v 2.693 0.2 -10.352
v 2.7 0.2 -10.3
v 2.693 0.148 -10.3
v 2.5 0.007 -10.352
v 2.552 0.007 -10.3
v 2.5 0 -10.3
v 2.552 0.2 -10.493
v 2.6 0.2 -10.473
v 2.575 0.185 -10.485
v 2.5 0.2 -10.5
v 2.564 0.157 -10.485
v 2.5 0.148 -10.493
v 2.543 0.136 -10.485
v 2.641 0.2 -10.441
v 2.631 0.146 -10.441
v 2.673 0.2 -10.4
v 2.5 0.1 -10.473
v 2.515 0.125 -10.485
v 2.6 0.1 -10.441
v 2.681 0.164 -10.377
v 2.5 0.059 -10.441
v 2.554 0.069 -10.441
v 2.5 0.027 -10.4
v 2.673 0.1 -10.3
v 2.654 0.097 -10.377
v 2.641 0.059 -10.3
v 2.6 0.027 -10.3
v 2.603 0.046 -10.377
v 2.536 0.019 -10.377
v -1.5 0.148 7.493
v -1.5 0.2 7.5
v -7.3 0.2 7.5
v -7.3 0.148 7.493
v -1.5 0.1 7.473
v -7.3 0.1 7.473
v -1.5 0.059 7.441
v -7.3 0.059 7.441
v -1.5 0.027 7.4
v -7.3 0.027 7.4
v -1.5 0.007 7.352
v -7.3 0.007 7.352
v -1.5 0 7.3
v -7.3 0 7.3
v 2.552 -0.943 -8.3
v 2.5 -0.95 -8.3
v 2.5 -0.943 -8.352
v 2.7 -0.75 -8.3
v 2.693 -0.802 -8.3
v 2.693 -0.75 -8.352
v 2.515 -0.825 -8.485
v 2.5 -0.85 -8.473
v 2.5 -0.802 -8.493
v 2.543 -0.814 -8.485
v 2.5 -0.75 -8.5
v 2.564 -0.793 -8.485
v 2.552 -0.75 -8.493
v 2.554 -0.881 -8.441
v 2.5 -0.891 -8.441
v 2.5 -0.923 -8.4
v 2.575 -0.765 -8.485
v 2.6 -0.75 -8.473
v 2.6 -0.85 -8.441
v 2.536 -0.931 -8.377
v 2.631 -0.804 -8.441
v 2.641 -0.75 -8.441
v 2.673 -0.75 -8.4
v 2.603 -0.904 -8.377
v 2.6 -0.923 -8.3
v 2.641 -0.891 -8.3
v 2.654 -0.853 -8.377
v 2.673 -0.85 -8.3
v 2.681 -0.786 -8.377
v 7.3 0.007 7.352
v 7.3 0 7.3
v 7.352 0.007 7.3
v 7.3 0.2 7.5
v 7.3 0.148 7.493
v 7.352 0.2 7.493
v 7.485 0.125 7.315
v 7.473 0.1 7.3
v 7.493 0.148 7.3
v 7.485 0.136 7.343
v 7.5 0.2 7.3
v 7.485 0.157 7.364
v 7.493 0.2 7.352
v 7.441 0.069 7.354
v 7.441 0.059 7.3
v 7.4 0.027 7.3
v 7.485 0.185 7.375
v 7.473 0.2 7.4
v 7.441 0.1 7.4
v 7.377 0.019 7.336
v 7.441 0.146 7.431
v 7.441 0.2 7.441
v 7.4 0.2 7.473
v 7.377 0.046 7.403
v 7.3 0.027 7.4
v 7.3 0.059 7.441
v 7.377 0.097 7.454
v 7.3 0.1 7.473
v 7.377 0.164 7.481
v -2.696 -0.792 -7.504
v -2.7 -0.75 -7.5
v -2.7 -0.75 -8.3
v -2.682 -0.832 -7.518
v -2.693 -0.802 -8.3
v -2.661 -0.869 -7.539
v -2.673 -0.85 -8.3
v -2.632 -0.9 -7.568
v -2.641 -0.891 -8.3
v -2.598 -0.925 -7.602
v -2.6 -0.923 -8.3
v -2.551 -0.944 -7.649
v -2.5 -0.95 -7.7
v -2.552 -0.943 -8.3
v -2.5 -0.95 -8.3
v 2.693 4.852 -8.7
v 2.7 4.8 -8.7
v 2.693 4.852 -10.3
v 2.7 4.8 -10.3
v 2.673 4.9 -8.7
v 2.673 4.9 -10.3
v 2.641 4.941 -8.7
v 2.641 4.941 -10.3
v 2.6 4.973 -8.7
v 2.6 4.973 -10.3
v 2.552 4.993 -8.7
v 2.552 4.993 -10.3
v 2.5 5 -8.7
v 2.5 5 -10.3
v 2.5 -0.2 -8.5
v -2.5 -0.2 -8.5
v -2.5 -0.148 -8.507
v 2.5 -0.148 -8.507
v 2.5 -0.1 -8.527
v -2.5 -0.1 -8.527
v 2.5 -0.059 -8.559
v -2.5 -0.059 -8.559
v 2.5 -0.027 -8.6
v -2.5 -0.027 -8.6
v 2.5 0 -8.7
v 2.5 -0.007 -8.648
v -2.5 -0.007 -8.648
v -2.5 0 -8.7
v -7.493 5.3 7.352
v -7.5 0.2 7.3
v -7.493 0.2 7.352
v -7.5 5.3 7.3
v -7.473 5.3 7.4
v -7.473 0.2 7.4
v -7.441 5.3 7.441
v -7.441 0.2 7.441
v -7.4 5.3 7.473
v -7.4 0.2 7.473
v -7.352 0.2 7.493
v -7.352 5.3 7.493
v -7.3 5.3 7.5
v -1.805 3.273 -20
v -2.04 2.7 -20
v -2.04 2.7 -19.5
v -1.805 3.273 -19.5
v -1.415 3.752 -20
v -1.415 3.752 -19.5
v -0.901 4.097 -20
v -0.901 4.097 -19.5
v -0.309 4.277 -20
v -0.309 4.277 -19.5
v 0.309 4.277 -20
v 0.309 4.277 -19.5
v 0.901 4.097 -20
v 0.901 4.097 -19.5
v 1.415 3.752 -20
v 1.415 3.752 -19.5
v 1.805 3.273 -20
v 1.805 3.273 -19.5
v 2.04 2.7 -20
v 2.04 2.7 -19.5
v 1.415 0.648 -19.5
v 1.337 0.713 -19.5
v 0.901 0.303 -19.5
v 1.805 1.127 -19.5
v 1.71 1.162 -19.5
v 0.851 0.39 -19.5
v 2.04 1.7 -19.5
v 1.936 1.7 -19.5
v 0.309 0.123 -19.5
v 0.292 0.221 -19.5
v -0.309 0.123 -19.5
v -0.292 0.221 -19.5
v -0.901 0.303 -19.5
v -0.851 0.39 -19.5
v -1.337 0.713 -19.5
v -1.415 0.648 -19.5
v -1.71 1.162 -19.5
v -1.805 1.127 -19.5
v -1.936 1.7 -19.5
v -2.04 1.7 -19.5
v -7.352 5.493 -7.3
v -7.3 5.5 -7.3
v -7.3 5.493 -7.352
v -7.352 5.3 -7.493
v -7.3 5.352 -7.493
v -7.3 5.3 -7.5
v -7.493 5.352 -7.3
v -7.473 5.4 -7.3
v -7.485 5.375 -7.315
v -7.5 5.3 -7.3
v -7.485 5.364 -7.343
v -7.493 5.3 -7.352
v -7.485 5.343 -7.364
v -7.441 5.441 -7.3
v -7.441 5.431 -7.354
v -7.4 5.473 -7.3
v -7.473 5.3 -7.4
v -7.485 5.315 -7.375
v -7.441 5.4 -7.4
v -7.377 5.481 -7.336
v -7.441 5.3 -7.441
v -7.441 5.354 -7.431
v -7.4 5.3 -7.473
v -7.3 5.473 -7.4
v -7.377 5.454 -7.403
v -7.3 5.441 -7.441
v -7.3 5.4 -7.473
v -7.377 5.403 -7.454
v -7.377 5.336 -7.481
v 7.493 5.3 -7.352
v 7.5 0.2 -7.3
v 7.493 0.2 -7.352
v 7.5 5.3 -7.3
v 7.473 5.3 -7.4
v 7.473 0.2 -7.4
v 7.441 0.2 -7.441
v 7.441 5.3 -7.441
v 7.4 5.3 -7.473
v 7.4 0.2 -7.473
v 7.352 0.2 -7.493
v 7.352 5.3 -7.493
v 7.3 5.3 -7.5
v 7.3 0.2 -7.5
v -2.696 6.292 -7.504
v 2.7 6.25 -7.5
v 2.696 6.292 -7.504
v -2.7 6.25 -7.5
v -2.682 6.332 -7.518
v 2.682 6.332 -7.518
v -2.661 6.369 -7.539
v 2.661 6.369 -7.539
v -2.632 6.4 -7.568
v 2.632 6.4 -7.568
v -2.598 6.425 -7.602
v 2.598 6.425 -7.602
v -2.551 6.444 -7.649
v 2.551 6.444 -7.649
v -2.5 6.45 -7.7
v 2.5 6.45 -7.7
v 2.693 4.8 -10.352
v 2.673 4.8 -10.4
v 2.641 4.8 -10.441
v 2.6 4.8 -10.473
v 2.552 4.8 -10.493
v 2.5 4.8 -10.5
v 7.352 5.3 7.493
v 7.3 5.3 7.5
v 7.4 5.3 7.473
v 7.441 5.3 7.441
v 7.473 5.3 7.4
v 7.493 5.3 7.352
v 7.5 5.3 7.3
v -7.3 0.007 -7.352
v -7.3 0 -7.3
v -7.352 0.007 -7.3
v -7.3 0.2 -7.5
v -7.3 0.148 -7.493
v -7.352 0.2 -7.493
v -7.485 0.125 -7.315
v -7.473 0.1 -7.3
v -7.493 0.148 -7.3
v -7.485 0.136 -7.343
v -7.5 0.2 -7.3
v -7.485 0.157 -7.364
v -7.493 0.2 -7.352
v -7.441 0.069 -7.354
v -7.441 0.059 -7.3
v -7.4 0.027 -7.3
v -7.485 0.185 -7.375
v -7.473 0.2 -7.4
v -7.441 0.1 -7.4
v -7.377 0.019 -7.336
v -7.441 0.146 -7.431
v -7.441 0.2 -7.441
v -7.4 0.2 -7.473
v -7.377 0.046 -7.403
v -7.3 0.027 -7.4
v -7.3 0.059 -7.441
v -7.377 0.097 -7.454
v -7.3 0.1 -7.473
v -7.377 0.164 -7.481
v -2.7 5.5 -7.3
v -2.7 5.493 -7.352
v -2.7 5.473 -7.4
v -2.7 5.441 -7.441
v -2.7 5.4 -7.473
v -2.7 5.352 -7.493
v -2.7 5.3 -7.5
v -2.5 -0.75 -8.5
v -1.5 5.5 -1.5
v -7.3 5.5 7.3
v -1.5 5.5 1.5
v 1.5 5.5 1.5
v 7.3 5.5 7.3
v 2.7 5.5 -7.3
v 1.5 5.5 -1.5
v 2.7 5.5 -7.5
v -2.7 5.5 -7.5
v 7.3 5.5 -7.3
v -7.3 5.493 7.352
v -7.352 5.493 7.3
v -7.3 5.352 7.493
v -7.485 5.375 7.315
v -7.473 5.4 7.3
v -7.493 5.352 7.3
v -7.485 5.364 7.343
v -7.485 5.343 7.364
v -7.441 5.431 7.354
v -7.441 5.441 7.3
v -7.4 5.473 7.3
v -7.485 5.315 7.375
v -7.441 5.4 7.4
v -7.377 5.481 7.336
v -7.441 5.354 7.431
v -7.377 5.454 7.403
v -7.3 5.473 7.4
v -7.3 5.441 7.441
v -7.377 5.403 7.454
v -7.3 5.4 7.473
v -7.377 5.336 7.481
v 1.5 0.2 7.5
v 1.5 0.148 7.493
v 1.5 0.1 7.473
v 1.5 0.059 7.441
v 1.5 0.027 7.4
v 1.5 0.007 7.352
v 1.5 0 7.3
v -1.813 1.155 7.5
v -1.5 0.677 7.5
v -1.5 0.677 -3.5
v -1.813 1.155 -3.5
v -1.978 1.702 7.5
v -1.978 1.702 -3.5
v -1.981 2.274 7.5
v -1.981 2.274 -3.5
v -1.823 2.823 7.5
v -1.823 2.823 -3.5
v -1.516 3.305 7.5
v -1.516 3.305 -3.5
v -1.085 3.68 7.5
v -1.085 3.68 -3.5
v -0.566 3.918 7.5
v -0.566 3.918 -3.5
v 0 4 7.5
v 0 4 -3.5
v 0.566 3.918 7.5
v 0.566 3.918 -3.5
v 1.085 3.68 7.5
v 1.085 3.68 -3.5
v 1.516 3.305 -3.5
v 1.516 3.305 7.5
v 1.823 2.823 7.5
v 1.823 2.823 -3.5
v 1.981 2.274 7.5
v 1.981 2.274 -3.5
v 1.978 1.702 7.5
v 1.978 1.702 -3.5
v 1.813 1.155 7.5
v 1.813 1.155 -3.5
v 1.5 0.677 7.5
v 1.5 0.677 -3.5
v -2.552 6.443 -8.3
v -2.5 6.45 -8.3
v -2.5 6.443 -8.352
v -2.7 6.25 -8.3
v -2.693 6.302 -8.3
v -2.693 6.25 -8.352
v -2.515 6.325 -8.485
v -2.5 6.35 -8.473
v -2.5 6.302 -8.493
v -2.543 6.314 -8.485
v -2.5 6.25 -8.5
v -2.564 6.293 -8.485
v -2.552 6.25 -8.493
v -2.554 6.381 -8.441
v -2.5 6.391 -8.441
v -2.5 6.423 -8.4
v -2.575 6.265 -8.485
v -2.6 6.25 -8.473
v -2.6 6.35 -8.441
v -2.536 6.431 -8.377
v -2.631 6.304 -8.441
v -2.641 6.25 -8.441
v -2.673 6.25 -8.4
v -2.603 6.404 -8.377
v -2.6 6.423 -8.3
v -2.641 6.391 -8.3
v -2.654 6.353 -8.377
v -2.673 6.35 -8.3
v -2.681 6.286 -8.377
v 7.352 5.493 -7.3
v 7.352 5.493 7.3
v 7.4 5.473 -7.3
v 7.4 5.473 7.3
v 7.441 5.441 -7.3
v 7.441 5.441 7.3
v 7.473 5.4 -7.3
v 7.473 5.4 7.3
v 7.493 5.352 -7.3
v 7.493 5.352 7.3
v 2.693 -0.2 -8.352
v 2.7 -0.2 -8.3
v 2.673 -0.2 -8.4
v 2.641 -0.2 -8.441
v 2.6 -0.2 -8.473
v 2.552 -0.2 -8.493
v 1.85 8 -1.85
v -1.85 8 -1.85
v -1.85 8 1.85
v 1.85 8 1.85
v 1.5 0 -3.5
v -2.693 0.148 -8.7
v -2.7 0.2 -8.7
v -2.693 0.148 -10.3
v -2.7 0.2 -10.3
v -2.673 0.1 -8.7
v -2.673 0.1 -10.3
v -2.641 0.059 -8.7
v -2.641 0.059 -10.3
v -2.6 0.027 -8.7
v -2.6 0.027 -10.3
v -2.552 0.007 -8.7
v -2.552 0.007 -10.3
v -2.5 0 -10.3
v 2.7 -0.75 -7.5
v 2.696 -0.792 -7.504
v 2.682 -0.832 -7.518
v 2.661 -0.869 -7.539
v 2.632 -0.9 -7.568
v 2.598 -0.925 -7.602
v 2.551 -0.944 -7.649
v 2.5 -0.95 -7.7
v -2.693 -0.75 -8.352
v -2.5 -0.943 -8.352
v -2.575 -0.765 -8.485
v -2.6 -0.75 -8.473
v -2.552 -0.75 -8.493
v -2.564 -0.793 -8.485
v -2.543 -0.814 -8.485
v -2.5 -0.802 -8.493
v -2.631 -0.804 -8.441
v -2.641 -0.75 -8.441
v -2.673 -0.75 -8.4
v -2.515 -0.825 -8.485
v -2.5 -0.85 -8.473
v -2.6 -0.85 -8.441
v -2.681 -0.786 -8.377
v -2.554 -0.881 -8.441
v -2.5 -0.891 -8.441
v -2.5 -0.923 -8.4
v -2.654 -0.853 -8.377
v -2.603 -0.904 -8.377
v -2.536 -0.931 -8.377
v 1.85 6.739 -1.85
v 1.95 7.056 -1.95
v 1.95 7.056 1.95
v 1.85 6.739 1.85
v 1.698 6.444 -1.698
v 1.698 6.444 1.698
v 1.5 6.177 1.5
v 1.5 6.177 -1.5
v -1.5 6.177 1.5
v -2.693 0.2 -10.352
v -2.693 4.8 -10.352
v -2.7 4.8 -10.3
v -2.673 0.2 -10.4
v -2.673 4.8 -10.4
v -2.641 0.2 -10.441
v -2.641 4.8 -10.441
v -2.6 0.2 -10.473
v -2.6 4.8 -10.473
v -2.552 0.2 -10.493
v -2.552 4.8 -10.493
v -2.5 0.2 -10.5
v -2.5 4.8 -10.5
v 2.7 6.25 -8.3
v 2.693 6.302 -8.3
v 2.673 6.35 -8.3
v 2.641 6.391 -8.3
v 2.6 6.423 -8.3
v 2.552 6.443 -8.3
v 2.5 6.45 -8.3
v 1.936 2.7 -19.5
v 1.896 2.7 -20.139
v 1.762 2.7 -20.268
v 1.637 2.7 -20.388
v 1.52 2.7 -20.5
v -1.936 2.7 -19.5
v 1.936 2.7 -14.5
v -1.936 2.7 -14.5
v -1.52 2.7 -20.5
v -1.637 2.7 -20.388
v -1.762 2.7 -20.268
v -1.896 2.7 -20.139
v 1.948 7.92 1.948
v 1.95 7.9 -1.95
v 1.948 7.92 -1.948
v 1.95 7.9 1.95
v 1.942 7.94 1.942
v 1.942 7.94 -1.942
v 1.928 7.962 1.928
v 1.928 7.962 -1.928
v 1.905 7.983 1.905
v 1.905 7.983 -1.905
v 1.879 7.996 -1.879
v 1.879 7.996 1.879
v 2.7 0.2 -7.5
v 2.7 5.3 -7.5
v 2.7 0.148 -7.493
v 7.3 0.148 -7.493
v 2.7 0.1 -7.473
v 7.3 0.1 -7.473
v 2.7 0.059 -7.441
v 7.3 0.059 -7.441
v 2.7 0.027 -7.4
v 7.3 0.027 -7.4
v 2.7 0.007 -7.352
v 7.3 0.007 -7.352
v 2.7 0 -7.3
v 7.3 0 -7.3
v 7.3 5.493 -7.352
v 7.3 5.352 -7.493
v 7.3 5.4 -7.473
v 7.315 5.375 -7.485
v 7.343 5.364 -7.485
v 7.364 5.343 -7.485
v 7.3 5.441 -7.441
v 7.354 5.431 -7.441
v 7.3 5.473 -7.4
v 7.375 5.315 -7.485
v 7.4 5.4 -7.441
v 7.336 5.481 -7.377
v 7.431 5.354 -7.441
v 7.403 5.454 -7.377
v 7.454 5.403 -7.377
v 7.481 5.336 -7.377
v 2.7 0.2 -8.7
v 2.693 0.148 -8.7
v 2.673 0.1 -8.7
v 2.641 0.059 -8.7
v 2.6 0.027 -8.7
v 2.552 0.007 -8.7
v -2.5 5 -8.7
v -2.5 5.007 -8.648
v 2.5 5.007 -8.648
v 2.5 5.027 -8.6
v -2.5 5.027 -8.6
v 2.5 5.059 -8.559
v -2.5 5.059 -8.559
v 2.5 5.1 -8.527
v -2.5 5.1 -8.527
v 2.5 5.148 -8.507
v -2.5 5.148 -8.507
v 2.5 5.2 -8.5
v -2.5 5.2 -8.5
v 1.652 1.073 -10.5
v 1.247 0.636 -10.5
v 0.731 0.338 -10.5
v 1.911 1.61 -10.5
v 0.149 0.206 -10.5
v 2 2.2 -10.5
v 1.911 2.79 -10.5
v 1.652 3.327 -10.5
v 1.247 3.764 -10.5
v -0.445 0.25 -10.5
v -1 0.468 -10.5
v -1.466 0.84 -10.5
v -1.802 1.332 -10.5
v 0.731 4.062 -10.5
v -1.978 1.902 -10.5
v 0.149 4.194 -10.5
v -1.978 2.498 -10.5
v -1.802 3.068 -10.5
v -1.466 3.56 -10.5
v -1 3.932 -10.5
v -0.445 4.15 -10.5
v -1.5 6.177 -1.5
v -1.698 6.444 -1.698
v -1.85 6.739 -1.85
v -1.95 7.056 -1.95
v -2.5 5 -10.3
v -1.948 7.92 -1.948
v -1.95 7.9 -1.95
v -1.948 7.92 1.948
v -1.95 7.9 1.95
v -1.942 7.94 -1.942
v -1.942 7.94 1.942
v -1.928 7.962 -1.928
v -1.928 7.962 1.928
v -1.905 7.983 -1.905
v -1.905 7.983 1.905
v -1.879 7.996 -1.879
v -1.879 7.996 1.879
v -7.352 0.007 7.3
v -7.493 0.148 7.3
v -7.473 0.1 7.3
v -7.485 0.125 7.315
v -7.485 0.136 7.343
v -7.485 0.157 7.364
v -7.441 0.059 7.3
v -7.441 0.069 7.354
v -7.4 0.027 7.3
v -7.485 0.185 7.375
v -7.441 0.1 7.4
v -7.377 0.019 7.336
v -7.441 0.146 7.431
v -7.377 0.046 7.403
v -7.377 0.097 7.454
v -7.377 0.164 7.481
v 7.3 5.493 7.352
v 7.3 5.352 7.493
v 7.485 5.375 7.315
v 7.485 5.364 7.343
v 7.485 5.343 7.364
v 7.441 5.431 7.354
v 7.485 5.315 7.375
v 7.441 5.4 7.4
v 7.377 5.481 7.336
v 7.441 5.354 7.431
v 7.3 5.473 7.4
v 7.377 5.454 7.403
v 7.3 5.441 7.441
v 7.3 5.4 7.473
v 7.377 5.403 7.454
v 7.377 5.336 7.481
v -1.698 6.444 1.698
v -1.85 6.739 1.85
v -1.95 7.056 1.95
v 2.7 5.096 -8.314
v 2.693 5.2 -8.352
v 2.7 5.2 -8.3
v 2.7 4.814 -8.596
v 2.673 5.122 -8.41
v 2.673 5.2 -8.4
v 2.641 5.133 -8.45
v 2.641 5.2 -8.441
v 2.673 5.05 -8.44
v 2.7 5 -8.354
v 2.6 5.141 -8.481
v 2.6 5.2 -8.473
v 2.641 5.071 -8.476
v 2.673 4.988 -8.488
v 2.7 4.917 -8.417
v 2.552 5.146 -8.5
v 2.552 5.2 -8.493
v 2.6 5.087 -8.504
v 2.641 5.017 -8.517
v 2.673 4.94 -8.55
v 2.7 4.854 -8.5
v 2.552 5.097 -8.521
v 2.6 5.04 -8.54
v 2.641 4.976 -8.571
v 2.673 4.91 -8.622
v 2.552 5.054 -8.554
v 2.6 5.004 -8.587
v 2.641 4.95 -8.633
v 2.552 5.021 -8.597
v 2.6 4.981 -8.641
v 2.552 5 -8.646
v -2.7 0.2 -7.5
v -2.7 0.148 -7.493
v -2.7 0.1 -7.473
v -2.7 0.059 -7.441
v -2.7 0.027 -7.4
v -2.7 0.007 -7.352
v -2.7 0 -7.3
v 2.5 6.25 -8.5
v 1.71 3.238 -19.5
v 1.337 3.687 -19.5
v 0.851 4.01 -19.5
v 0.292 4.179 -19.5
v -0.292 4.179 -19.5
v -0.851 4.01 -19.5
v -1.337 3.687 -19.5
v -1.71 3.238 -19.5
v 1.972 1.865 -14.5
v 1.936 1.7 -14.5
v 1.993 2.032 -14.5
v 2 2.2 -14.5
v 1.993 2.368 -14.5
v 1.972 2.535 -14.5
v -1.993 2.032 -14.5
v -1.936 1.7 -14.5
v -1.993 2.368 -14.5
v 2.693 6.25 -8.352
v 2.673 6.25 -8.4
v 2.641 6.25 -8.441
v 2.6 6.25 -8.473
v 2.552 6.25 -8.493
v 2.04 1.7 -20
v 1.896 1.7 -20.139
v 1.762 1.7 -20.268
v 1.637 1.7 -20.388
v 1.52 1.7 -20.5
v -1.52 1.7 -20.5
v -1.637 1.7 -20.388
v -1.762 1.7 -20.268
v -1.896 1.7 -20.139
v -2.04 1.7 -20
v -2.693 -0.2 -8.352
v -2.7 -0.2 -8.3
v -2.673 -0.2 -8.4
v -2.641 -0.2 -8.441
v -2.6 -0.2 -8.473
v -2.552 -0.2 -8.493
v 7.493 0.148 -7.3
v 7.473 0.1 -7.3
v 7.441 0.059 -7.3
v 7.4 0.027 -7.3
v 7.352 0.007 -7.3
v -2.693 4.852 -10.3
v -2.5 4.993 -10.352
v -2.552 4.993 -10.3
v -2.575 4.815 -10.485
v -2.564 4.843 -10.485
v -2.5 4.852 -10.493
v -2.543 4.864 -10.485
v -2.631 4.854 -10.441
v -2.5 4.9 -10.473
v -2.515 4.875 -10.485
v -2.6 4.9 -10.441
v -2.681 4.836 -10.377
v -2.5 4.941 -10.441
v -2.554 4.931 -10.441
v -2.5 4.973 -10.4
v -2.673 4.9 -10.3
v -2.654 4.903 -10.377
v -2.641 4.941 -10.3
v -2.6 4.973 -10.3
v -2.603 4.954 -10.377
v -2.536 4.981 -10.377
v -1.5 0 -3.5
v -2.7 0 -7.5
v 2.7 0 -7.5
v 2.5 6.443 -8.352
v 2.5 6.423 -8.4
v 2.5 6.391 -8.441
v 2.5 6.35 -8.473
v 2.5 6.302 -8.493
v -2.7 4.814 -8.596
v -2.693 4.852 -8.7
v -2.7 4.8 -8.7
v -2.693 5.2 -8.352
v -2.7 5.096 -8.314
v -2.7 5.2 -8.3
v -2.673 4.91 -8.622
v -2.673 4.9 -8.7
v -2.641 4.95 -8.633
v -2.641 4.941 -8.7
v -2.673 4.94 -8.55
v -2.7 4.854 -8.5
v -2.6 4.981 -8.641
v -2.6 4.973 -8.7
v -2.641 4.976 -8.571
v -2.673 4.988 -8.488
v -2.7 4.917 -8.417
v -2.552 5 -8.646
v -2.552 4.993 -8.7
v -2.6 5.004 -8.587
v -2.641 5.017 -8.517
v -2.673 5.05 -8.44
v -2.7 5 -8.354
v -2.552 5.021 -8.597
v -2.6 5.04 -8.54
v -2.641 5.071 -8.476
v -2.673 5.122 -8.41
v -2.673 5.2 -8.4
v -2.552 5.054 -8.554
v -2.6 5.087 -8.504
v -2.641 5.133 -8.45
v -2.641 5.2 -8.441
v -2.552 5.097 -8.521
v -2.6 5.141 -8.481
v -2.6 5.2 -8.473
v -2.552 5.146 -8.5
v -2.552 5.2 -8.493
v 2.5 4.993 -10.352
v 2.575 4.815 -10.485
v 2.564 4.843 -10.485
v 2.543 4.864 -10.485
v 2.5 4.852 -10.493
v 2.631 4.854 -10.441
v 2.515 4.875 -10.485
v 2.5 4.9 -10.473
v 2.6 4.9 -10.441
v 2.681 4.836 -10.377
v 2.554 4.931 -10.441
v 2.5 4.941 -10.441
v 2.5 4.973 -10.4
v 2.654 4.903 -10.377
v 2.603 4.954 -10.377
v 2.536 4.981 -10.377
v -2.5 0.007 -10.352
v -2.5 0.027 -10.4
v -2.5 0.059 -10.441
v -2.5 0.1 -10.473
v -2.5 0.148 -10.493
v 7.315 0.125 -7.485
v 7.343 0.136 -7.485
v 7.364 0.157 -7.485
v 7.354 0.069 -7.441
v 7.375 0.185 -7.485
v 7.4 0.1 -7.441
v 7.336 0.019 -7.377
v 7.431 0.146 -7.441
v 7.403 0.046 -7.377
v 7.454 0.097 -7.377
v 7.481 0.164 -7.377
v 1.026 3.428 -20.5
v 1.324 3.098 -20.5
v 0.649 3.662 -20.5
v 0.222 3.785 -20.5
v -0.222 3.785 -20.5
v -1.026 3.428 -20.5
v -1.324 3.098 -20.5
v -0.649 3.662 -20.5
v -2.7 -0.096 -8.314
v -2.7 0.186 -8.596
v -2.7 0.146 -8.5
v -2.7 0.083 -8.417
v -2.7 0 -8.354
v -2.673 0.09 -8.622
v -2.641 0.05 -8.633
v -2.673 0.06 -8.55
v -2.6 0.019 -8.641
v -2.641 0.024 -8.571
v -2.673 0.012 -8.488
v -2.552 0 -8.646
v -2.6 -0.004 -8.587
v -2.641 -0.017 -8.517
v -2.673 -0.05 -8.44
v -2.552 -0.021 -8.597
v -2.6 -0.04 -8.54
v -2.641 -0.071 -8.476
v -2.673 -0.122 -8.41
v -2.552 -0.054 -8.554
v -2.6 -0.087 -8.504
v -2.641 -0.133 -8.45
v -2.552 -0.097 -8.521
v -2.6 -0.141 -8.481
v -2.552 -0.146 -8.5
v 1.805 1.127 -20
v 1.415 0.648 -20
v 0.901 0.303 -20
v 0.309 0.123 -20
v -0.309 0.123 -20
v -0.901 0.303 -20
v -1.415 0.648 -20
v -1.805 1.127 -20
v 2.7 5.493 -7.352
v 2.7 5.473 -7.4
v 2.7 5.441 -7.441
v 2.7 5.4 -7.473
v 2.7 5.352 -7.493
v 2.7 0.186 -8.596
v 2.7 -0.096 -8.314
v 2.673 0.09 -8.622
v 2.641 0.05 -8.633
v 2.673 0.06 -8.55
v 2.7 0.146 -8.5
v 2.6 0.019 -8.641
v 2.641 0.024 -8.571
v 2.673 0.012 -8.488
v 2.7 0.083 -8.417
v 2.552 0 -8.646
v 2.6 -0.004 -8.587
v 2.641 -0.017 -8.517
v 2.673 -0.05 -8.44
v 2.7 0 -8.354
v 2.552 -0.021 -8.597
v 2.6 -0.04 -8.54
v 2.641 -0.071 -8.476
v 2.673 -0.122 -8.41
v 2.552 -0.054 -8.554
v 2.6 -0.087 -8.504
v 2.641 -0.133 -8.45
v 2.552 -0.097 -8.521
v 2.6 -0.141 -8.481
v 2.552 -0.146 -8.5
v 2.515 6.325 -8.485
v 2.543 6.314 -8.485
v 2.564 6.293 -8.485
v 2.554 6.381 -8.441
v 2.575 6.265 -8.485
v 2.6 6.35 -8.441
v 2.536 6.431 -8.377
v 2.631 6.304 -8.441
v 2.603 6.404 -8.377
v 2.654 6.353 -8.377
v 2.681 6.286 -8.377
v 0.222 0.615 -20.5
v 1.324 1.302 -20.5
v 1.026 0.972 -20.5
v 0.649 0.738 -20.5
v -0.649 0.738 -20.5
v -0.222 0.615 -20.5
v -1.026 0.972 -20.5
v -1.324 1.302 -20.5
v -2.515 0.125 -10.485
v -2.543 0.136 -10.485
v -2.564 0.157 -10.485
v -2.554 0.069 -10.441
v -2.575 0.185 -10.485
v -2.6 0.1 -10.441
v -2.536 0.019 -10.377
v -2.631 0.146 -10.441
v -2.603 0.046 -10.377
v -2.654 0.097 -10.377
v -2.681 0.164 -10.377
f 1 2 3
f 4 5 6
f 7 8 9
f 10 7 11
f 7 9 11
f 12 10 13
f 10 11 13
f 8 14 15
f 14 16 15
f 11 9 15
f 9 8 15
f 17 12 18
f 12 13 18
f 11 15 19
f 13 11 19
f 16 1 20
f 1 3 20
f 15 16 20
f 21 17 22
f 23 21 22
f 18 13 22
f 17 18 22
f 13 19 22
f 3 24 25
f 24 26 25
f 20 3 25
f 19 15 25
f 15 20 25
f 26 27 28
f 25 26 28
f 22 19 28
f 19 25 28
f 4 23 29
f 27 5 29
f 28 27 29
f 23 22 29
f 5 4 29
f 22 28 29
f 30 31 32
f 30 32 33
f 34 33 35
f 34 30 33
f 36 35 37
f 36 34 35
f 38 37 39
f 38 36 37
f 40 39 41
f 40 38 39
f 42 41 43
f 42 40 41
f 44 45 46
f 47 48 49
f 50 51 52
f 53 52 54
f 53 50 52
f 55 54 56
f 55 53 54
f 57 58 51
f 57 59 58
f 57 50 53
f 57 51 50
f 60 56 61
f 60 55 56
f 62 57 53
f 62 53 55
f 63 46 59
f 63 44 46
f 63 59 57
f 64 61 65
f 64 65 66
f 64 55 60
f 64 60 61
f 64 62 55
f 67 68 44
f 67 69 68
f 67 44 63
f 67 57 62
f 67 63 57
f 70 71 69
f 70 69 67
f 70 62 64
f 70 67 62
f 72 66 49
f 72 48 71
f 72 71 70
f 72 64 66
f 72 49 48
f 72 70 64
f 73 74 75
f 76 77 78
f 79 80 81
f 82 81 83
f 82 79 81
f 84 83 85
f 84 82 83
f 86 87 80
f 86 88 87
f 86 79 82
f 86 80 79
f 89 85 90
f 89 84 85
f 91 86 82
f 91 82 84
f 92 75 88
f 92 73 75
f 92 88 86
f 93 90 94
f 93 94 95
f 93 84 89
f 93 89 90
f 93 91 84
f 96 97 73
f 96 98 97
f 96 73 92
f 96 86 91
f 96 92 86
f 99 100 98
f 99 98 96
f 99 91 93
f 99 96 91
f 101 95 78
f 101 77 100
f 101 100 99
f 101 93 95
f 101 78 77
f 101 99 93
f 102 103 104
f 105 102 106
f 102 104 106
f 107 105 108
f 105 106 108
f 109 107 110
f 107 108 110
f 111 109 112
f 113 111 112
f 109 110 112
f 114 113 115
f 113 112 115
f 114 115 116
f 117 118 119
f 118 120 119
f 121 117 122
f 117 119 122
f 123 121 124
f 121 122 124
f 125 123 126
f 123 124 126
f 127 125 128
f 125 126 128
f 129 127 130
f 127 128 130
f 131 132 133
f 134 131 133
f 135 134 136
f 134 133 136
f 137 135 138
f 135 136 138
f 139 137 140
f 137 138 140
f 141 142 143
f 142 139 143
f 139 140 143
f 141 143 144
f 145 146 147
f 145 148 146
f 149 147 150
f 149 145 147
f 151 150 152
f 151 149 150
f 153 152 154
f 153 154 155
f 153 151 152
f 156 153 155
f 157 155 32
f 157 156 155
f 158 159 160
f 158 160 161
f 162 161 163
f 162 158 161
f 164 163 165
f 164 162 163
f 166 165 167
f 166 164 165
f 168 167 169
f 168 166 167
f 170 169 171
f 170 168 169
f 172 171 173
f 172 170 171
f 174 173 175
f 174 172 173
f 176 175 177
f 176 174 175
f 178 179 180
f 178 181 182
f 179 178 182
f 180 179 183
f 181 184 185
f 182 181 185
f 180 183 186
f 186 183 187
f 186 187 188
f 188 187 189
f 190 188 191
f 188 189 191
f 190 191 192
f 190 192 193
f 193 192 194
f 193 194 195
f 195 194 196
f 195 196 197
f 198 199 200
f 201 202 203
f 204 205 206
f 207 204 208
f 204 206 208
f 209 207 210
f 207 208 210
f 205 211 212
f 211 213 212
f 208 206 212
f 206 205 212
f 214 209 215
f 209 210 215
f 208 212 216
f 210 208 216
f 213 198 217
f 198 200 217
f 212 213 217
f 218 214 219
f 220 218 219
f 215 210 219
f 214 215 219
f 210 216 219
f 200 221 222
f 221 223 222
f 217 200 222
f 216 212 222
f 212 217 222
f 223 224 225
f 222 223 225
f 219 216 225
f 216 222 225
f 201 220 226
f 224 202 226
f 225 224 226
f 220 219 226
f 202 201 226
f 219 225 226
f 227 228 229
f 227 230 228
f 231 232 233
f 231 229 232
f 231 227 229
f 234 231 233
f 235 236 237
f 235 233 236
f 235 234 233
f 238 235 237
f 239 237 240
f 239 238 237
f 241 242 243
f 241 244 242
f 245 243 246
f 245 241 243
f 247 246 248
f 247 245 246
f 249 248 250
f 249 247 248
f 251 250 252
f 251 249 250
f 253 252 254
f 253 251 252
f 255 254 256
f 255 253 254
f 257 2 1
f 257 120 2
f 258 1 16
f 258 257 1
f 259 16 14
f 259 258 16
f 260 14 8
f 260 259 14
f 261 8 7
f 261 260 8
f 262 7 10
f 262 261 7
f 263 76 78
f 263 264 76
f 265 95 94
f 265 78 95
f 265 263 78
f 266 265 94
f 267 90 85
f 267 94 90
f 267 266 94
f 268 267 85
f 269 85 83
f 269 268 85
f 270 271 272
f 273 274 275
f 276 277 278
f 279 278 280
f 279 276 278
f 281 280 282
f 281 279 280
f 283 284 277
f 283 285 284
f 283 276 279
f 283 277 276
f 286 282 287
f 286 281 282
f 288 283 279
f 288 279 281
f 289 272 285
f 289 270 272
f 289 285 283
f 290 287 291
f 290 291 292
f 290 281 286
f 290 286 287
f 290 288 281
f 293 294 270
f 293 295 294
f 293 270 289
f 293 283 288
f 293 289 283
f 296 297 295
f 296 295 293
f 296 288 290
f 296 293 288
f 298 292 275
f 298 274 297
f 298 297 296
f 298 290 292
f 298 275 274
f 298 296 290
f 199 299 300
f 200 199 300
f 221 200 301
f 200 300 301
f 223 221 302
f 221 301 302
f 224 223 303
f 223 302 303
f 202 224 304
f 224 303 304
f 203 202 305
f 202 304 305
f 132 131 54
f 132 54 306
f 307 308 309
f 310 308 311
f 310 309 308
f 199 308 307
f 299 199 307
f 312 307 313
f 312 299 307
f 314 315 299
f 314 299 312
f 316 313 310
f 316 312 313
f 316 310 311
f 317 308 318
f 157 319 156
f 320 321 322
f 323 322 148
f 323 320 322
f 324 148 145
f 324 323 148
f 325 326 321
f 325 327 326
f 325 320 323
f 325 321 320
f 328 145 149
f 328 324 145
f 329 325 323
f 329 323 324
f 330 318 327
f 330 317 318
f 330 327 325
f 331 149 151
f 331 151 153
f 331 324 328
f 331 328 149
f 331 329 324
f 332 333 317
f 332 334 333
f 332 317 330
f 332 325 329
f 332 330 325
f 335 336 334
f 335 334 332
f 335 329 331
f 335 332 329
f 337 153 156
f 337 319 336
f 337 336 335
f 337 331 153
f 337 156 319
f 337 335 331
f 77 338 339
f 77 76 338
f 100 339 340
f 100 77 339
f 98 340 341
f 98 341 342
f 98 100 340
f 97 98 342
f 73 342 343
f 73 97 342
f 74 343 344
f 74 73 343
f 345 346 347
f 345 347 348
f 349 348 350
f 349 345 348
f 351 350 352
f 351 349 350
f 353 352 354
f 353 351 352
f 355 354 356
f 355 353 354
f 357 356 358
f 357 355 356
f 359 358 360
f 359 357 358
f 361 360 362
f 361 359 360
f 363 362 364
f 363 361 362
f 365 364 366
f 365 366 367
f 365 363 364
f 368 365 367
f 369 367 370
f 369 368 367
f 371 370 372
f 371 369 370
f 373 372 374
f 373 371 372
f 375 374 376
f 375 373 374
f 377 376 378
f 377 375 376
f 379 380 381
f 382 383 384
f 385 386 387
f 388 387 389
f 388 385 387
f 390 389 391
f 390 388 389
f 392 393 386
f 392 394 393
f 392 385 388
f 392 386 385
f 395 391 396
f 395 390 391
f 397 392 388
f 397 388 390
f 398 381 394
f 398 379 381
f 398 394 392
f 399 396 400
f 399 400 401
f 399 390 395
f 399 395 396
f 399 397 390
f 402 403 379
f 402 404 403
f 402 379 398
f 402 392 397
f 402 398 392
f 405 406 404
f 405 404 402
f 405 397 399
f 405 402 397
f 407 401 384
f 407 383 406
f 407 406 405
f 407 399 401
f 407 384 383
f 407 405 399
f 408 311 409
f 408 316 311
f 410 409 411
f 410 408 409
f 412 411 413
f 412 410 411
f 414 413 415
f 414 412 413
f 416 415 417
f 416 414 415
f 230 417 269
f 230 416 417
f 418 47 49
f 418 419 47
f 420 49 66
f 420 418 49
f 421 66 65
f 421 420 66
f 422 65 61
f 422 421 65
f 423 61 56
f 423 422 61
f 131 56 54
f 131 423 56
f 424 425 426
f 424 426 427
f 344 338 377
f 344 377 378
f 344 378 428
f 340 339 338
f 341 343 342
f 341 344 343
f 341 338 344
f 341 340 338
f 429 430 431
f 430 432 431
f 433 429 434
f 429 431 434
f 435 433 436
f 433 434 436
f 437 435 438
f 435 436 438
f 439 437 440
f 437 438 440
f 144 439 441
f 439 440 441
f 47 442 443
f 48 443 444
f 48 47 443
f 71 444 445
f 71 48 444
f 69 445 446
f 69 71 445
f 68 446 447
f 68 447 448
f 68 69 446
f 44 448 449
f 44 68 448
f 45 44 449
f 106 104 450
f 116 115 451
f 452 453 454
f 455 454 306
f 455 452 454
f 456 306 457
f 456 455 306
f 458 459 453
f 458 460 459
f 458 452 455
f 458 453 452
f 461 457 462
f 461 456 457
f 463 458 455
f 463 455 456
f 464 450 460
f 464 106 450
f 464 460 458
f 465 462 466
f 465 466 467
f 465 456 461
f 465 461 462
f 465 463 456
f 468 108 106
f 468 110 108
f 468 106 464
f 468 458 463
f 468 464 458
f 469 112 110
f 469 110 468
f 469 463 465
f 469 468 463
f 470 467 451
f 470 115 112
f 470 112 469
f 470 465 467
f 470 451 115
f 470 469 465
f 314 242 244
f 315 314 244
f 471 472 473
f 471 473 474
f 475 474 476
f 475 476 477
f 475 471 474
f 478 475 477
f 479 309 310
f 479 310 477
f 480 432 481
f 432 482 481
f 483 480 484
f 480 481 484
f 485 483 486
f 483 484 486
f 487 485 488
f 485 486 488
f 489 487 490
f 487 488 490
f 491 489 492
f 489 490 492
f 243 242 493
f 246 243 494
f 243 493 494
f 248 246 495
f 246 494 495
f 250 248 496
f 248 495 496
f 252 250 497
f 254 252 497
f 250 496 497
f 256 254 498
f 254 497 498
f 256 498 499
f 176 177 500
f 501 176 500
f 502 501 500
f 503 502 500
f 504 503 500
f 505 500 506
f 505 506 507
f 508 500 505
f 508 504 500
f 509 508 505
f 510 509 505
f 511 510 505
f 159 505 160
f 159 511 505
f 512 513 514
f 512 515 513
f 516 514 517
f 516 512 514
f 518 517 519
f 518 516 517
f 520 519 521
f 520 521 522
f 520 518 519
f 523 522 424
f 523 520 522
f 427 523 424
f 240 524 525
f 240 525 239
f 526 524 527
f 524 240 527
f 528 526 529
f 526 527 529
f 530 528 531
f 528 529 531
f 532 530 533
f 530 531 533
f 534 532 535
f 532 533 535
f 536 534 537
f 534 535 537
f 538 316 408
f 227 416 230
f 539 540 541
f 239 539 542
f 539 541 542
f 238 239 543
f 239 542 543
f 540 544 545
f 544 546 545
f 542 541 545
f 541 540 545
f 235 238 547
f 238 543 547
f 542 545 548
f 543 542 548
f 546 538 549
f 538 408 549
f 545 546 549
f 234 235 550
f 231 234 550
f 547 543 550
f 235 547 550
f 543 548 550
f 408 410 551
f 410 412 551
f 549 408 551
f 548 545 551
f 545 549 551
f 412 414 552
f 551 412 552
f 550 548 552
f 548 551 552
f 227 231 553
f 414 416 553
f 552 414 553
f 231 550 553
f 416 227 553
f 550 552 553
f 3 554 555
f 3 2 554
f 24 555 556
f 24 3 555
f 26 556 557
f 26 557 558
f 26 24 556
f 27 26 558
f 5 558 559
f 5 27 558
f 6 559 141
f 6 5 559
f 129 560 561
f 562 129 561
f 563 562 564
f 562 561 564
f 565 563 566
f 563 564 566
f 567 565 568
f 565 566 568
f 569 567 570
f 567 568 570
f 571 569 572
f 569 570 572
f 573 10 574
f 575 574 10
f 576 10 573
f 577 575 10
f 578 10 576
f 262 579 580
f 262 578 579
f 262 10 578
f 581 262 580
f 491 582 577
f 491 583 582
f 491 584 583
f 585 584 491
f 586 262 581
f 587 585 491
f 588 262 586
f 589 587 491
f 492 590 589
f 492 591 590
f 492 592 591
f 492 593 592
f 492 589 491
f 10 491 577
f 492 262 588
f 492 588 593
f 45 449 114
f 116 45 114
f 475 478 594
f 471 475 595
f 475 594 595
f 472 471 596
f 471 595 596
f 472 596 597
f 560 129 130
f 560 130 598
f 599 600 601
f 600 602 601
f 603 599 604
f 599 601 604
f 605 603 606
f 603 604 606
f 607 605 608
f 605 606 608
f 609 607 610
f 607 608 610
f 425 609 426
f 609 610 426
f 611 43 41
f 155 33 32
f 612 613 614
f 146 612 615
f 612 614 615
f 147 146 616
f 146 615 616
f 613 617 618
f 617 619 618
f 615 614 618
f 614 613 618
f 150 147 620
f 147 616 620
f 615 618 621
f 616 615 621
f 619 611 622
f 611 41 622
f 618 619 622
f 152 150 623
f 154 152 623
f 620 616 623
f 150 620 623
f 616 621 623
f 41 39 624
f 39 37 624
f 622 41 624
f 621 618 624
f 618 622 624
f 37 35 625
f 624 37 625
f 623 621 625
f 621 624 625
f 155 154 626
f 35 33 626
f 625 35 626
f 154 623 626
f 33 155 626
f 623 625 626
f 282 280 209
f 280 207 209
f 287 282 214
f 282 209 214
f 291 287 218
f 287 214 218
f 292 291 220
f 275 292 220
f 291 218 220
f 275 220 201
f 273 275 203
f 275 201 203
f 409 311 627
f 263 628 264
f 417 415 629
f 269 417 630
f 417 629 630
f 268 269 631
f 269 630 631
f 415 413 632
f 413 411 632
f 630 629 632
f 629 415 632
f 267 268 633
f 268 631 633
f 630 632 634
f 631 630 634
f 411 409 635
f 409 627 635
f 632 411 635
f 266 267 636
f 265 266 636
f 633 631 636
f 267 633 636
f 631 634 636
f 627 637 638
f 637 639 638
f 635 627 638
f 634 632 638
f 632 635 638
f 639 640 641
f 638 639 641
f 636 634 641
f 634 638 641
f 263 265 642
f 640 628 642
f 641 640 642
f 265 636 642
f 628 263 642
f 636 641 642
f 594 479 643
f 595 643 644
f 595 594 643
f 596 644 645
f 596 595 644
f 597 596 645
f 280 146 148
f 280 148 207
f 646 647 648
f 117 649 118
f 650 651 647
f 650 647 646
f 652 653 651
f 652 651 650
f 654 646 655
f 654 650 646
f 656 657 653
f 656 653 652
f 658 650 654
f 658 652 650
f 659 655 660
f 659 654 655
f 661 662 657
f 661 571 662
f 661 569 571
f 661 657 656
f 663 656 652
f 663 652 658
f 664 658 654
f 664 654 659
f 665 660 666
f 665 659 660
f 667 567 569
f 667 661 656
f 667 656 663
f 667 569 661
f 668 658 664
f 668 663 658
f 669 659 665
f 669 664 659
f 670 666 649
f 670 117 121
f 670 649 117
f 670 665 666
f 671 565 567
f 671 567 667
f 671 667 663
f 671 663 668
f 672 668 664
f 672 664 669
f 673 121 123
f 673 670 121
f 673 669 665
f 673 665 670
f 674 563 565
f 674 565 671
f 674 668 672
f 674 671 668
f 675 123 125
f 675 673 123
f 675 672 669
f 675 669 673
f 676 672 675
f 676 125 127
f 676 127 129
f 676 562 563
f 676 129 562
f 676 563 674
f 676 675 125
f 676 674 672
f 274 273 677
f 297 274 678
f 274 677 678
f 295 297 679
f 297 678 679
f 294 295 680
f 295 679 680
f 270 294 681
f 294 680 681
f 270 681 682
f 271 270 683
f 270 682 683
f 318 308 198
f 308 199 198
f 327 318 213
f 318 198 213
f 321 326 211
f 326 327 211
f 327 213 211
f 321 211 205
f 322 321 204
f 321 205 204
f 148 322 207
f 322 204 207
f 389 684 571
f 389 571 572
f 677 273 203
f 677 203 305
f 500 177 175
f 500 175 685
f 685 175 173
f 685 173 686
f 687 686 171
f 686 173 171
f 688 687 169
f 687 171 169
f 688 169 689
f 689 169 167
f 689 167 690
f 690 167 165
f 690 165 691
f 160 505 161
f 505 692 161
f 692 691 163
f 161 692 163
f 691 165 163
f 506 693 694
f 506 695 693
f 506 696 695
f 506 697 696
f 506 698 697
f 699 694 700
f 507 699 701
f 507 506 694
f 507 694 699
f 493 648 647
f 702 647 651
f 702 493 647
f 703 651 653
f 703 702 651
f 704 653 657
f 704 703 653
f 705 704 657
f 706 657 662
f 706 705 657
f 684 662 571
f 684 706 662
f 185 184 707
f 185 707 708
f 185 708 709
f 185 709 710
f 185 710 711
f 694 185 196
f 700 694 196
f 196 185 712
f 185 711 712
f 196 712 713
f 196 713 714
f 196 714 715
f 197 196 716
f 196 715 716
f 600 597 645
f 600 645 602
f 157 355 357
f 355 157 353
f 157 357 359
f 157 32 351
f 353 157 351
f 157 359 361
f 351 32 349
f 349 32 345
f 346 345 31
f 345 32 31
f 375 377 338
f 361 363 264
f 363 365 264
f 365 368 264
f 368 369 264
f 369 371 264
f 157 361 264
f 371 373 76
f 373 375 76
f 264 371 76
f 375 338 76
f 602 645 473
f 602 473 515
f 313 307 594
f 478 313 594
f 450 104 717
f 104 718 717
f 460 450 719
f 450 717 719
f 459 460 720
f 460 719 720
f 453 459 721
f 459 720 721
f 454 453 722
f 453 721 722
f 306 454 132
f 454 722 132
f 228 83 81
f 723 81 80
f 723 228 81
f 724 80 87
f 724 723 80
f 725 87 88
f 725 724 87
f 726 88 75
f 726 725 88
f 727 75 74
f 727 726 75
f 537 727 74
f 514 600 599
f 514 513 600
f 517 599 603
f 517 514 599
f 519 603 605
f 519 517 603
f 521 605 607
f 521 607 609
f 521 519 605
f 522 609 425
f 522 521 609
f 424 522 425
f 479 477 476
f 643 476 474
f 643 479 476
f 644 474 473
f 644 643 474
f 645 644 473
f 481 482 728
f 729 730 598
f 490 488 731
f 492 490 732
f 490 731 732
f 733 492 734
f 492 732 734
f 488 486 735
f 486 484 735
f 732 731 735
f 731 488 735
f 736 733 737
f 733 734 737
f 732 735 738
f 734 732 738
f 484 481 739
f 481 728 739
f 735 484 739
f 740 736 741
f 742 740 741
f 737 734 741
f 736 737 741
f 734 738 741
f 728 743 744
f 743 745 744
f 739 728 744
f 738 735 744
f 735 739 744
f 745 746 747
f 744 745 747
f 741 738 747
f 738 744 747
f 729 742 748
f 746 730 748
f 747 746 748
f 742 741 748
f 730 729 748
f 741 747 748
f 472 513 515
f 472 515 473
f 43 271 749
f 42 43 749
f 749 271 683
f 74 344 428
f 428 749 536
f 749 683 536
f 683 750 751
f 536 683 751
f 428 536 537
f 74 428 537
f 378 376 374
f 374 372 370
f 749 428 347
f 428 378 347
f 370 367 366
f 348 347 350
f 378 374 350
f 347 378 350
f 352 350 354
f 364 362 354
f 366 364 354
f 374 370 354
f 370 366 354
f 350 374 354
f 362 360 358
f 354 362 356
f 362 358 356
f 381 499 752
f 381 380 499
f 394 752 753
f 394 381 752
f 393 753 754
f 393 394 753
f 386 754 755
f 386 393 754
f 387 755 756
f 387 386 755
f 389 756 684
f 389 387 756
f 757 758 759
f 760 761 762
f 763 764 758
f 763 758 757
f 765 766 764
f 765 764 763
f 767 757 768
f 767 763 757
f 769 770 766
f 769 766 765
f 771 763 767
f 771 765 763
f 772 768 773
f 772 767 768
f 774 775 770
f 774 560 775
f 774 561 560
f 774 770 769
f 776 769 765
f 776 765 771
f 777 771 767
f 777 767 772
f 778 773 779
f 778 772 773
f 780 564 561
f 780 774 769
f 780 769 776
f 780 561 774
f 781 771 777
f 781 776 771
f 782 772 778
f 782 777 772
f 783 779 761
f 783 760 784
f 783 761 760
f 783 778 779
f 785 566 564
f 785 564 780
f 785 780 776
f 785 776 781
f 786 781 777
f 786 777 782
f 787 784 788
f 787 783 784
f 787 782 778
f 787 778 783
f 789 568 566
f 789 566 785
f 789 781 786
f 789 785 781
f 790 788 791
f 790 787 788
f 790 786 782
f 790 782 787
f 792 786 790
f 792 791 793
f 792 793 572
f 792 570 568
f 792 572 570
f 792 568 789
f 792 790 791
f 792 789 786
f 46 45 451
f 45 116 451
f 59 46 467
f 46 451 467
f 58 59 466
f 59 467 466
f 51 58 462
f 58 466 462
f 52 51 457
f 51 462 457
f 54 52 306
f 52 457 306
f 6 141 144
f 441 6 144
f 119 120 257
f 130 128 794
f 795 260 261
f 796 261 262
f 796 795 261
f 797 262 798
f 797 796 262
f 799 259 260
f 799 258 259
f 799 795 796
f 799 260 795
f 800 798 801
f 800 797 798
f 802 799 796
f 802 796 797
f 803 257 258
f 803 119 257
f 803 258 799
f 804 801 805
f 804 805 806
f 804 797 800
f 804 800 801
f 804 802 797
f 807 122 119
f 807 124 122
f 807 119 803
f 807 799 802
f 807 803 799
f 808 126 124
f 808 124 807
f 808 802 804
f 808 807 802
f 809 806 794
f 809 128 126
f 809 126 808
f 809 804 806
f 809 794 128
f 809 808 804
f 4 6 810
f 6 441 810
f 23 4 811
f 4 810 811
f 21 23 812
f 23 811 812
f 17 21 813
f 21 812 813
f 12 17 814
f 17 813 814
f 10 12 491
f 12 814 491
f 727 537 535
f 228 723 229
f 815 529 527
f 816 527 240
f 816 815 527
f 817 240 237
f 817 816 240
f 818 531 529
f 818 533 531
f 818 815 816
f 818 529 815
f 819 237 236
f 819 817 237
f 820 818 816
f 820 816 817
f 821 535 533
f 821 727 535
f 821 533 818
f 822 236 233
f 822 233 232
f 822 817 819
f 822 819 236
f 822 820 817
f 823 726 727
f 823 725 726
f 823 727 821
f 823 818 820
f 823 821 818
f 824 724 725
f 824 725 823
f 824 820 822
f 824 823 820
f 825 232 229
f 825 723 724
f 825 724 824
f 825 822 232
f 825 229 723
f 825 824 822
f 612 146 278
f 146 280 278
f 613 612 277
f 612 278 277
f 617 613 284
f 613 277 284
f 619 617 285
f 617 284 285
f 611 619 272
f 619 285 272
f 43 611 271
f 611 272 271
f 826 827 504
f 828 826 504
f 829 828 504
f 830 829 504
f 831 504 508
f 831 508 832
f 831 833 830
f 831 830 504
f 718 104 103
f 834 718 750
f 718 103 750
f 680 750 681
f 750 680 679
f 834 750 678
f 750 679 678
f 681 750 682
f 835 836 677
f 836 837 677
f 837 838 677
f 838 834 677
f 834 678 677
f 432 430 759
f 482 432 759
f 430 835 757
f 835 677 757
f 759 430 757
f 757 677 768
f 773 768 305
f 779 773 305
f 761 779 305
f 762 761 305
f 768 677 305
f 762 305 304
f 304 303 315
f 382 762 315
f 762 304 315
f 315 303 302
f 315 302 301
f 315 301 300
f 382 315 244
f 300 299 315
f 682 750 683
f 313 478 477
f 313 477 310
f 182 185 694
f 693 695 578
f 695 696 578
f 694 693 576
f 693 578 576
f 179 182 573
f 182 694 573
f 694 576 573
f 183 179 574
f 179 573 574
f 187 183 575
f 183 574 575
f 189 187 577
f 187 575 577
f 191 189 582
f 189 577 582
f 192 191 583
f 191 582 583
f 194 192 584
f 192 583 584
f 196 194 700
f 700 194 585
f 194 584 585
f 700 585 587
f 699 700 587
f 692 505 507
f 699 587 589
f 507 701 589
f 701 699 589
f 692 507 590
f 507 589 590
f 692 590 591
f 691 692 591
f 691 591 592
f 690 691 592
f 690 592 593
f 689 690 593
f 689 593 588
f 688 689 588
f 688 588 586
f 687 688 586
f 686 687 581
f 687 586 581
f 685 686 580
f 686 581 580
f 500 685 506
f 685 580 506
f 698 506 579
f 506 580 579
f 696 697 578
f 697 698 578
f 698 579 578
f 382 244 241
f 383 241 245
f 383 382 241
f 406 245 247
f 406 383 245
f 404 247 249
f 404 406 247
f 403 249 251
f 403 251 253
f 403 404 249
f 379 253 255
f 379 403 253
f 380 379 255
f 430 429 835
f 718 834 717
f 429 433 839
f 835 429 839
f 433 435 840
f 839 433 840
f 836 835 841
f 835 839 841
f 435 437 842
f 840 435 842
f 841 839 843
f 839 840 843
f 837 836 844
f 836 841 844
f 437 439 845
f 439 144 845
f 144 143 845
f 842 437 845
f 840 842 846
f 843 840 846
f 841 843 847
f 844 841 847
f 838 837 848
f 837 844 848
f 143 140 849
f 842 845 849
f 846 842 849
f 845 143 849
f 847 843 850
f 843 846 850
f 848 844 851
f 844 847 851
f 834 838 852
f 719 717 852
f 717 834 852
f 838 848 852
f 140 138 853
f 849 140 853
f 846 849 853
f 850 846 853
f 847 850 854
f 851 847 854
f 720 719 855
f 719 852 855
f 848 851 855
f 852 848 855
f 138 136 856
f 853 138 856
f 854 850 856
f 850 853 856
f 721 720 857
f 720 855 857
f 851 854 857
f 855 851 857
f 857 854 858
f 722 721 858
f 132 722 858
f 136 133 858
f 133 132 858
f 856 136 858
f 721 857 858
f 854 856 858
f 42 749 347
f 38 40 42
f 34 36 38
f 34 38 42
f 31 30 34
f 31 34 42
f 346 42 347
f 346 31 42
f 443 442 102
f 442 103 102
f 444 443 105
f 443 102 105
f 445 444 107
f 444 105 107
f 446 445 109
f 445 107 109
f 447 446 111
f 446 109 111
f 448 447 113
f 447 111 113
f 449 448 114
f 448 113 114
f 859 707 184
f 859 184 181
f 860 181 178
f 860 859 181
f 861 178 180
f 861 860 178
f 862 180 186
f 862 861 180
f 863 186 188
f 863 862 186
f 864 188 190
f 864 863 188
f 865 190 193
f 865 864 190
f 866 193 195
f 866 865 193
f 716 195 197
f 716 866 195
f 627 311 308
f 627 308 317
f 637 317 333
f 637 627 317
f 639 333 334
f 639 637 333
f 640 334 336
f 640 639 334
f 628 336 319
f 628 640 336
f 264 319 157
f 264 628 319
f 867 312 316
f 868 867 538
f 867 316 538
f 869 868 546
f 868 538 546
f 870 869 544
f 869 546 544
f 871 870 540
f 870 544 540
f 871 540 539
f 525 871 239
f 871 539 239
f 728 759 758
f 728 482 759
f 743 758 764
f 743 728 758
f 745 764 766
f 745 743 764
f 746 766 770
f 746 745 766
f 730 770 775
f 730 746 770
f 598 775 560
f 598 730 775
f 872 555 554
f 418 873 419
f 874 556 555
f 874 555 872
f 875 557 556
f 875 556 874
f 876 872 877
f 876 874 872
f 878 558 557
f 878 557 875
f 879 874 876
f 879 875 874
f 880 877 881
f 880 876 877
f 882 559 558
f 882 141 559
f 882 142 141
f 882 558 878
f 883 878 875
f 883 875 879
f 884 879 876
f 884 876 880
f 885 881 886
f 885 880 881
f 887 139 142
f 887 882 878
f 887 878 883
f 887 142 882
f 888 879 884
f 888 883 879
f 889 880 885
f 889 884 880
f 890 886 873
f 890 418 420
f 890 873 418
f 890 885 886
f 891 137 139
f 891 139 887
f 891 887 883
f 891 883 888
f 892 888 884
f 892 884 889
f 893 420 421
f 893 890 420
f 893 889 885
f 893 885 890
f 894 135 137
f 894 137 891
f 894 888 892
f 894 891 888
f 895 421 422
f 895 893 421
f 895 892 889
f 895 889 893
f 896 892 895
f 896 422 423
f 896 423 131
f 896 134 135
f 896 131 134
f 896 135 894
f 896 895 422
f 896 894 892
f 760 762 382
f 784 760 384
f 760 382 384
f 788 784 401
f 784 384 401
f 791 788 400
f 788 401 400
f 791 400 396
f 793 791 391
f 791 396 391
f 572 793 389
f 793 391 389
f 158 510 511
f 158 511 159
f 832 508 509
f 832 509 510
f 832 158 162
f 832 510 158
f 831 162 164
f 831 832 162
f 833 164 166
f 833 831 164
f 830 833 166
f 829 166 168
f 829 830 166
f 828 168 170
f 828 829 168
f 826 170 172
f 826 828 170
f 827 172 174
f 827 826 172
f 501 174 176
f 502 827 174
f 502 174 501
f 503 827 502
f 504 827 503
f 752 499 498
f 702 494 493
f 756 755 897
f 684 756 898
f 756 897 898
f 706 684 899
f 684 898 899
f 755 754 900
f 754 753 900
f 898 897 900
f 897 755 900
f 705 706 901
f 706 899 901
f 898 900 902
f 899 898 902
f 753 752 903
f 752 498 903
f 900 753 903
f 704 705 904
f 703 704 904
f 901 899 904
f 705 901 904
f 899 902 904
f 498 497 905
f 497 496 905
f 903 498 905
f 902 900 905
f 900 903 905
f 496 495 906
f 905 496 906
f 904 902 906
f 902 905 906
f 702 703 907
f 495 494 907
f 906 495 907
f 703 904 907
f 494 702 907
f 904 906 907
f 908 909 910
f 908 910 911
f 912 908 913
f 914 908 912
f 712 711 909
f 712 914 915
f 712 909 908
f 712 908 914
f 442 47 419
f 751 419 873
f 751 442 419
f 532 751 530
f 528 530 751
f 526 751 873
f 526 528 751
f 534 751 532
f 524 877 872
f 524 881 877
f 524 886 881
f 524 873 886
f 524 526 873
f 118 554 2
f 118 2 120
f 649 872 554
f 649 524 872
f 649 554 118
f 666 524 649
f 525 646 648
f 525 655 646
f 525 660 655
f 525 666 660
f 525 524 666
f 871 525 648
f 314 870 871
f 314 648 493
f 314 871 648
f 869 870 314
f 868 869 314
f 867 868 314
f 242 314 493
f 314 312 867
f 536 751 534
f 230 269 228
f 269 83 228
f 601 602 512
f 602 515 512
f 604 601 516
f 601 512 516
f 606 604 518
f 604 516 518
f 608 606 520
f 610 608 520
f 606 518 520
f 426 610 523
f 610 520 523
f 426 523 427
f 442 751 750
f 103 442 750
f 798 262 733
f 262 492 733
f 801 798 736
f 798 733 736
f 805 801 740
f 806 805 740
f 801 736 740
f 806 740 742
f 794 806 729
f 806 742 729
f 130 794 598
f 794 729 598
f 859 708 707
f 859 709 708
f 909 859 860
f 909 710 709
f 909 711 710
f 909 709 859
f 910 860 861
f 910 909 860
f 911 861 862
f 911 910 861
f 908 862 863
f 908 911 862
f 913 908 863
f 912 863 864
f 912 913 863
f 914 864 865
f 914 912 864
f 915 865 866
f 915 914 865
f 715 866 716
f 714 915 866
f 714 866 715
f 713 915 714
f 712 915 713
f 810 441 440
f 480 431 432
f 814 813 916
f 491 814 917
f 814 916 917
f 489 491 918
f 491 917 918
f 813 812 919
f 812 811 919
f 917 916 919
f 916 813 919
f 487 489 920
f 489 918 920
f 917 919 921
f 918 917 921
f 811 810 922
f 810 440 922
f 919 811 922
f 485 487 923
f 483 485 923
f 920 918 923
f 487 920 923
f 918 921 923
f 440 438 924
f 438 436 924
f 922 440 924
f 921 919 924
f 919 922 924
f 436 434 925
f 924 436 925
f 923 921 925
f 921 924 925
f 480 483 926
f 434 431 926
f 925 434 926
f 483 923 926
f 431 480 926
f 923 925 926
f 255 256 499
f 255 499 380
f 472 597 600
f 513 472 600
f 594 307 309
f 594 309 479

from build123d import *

# Parameters (mm, degrees)
SKETCH_1_W               = 15
SKETCH_1_H               = 15
EXTRUDE_1_DEPTH          = 5.5
CUT_EXTRUDE_1_DEPTH      = 11
EXTRUDE_2_DEPTH          = 2
EXTRUDE_2_DEPTH_BACK     = 2
CUT_EXTRUDE_2_DEPTH      = 2
CUT_EXTRUDE_2_DEPTH_BACK = 2
SKETCH_5_W               = 5.4
SKETCH_5_H               = 7.4
EXTRUDE_3_DEPTH          = 1
SKETCH_6_W               = 5.4
SKETCH_6_H               = 5
EXTRUDE_4_DEPTH          = 2
SKETCH_7_R               = 2
EXTRUDE_5_DEPTH          = 10
SKETCH_8_R               = 2.1
EXTRUDE_6_DEPTH          = 1
CHAMFER_1_SIZE           = 0.5
SKETCH_9_W               = 5
SKETCH_9_H               = 1
CUT_EXTRUDE_3_DEPTH      = 6
FILLET_1_R               = 0.1
FILLET_2_R               = 0.2


with BuildPart() as part:
    # 草图1 → 凸台-拉伸1 (new body)
    with BuildSketch(Plane(origin=(0, 0, 0), x_dir=(1, 0, 0), z_dir=(0, 1, 0))):
        Rectangle(SKETCH_1_W, SKETCH_1_H)
    extrude(amount=EXTRUDE_1_DEPTH)

    # 草图2 → 切除-拉伸1 (cut)
    with BuildSketch(Plane.XY.offset(7.5)):
        with BuildLine():
            Line((1.5, 0), (-1.5, 0))
            Line((-1.5, 0), (-1.5, 0.677124344))
            ThreePointArc((-1.5, 0.677124344), (0, 4), (1.5, 0.677124344))
            Line((1.5, 0.677124344), (1.5, 0))
        make_face()
    extrude(amount=-CUT_EXTRUDE_1_DEPTH, mode=Mode.SUBTRACT)

    # 草图3 → 凸台-拉伸2 (add, two sides: drawn at the far end of the back side and taken through both)
    with BuildSketch(Plane.XY.offset(-EXTRUDE_2_DEPTH_BACK)):
        with BuildLine():
            Line((1.5, 5.5), (-1.5, 5.5))
            Line((-1.5, 5.5), (-1.5, 6.177124344))
            ThreePointArc((-1.5, 6.177124344), (-1.780042303, 6.588161527), (-1.95, 7.055590279))
            Line((-1.95, 7.055590279), (-1.95, 8))
            Line((-1.95, 8), (1.95, 8))
            Line((1.95, 8), (1.95, 7.055590279))
            ThreePointArc((1.95, 7.055590279), (1.780042303, 6.588161527), (1.5, 6.177124344))
            Line((1.5, 6.177124344), (1.5, 5.5))
        make_face()
    extrude(amount=EXTRUDE_2_DEPTH + EXTRUDE_2_DEPTH_BACK)

    # 草图4 → 切除-拉伸2 (cut, two sides: drawn at the far end of the back side and taken through both)
    with BuildSketch(Plane(origin=(0, 0, 0), x_dir=(0, 0, -1), z_dir=(1, 0, 0)).offset(-CUT_EXTRUDE_2_DEPTH_BACK)):
        with BuildLine():
            Line((-1.5, 5.5), (-1.5, 6.177124344))
            ThreePointArc((-1.5, 6.177124344), (-1.780042303, 6.588161527), (-1.95, 7.055590279))
            Line((-1.95, 7.055590279), (-1.95, 8))
            Line((-1.95, 8), (-2, 8))
            Line((-2, 8), (-2, 5.5))
            Line((-2, 5.5), (-1.5, 5.5))
        make_face()
        with BuildLine():
            Line((2, 5.5), (1.5, 5.5))
            Line((1.5, 5.5), (1.5, 6.177124344))
            ThreePointArc((1.5, 6.177124344), (1.780042303, 6.588161527), (1.95, 7.055590279))
            Line((1.95, 7.055590279), (1.95, 8))
            Line((1.95, 8), (2, 8))
            Line((2, 8), (2, 5.5))
        make_face()
    extrude(amount=CUT_EXTRUDE_2_DEPTH + CUT_EXTRUDE_2_DEPTH_BACK, mode=Mode.SUBTRACT)

    # 草图5 → 凸台-拉伸3 (add)
    with BuildSketch(Plane(origin=(0, 0, -7.5), x_dir=(-1, 0, 0), z_dir=(0, 0, -1))):
        with Locations((0, 2.75)):
            Rectangle(SKETCH_5_W, SKETCH_5_H)
    extrude(amount=EXTRUDE_3_DEPTH)

    # 草图6 → 凸台-拉伸4 (add)
    with BuildSketch(Plane(origin=(0, 0, -8.5), x_dir=(-1, 0, 0), z_dir=(0, 0, -1))):
        with Locations((0, 2.5)):
            Rectangle(SKETCH_6_W, SKETCH_6_H)
    extrude(amount=EXTRUDE_4_DEPTH)

    # 草图7 → 凸台-拉伸5 (add)
    with BuildSketch(Plane(origin=(0, 0, -10.5), x_dir=(-1, 0, 0), z_dir=(0, 0, -1))):
        with Locations(Location((0, 2.2, 0), (0, 0, 180))):
            Circle(SKETCH_7_R)
    extrude(amount=EXTRUDE_5_DEPTH)

    # 草图8 → 凸台-拉伸6 (add)
    with BuildSketch(Plane(origin=(0, 0, -20.5), x_dir=(-1, 0, 0), z_dir=(0, 0, -1))):
        with Locations((0, 2.2)):
            Circle(SKETCH_8_R)
    extrude(amount=-EXTRUDE_6_DEPTH)

    # 倒角1
    chamfer_1_edges = [part.edges().sort_by_distance(p)[0] for p in [
        (2.1, 2.2, -20.5),
    ]]
    chamfer(chamfer_1_edges, length=CHAMFER_1_SIZE)

    # 草图9 → 切除-拉伸3 (cut)
    with BuildSketch(Plane(origin=(0, 0, -20.5), x_dir=(-1, 0, 0), z_dir=(0, 0, -1))):
        with Locations((0, 2.2)):
            Rectangle(SKETCH_9_W, SKETCH_9_H)
    extrude(amount=-CUT_EXTRUDE_3_DEPTH, mode=Mode.SUBTRACT)

    # 圆角1
    fillet_1_edges = [part.edges().sort_by_distance(p)[0] for p in [
        (1.95, 8, 0),
        (-1.95, 8, 0),
        (0, 8, -1.95),
        (0, 8, 1.95),
    ]]
    fillet(fillet_1_edges, radius=FILLET_1_R)

    # 圆角2
    fillet_2_edges = [part.edges().sort_by_distance(p)[0] for p in [
        (0, 5.5, 7.5),
        (-5.1, 0, -7.5),
        (-5.1, 5.5, -7.5),
        (-2.7, -0.95, -8),
        (0, 6.45, -7.5),
        (-2.7, 6.45, -8),
        (2.7, 6.45, -8),
        (0, -0.95, -7.5),
        (2.7, -0.95, -8),
        (-2.7, -0.475, -8.5),
        (0, 6.45, -8.5),
        (2.7, 5.725, -8.5),
        (0, -0.95, -8.5),
        (7.5, 5.5, 0),
        (-2.7, 5.725, -8.5),
        (2.7, -0.475, -8.5),
        (4.5, 0, 7.5),
        (2.7, 5, -9.5),
        (0, 0, -8.5),
        (2.7, 0, -9.5),
        (-2.7, 0, -9.5),
        (0, 5, -8.5),
        (-2.7, 5, -9.5),
        (2.7, 2.5, -10.5),
        (0, 0, -10.5),
        (-2.7, 2.5, -10.5),
        (0, 5, -10.5),
        (5.1, 5.5, -7.5),
        (7.5, 0, 0),
        (-4.5, 0, 7.5),
        (-7.5, 0, 0),
        (5.1, 0, -7.5),
        (-7.5, 5.5, 0),
        (7.5, 2.75, -7.5),
        (7.5, 2.75, 7.5),
        (-7.5, 2.75, 7.5),
        (-7.5, 2.75, -7.5),
    ]]
    fillet(fillet_2_edges, radius=FILLET_2_R - 0.0001)  # a hair under: the kernel refuses the full size


solid = part.part
